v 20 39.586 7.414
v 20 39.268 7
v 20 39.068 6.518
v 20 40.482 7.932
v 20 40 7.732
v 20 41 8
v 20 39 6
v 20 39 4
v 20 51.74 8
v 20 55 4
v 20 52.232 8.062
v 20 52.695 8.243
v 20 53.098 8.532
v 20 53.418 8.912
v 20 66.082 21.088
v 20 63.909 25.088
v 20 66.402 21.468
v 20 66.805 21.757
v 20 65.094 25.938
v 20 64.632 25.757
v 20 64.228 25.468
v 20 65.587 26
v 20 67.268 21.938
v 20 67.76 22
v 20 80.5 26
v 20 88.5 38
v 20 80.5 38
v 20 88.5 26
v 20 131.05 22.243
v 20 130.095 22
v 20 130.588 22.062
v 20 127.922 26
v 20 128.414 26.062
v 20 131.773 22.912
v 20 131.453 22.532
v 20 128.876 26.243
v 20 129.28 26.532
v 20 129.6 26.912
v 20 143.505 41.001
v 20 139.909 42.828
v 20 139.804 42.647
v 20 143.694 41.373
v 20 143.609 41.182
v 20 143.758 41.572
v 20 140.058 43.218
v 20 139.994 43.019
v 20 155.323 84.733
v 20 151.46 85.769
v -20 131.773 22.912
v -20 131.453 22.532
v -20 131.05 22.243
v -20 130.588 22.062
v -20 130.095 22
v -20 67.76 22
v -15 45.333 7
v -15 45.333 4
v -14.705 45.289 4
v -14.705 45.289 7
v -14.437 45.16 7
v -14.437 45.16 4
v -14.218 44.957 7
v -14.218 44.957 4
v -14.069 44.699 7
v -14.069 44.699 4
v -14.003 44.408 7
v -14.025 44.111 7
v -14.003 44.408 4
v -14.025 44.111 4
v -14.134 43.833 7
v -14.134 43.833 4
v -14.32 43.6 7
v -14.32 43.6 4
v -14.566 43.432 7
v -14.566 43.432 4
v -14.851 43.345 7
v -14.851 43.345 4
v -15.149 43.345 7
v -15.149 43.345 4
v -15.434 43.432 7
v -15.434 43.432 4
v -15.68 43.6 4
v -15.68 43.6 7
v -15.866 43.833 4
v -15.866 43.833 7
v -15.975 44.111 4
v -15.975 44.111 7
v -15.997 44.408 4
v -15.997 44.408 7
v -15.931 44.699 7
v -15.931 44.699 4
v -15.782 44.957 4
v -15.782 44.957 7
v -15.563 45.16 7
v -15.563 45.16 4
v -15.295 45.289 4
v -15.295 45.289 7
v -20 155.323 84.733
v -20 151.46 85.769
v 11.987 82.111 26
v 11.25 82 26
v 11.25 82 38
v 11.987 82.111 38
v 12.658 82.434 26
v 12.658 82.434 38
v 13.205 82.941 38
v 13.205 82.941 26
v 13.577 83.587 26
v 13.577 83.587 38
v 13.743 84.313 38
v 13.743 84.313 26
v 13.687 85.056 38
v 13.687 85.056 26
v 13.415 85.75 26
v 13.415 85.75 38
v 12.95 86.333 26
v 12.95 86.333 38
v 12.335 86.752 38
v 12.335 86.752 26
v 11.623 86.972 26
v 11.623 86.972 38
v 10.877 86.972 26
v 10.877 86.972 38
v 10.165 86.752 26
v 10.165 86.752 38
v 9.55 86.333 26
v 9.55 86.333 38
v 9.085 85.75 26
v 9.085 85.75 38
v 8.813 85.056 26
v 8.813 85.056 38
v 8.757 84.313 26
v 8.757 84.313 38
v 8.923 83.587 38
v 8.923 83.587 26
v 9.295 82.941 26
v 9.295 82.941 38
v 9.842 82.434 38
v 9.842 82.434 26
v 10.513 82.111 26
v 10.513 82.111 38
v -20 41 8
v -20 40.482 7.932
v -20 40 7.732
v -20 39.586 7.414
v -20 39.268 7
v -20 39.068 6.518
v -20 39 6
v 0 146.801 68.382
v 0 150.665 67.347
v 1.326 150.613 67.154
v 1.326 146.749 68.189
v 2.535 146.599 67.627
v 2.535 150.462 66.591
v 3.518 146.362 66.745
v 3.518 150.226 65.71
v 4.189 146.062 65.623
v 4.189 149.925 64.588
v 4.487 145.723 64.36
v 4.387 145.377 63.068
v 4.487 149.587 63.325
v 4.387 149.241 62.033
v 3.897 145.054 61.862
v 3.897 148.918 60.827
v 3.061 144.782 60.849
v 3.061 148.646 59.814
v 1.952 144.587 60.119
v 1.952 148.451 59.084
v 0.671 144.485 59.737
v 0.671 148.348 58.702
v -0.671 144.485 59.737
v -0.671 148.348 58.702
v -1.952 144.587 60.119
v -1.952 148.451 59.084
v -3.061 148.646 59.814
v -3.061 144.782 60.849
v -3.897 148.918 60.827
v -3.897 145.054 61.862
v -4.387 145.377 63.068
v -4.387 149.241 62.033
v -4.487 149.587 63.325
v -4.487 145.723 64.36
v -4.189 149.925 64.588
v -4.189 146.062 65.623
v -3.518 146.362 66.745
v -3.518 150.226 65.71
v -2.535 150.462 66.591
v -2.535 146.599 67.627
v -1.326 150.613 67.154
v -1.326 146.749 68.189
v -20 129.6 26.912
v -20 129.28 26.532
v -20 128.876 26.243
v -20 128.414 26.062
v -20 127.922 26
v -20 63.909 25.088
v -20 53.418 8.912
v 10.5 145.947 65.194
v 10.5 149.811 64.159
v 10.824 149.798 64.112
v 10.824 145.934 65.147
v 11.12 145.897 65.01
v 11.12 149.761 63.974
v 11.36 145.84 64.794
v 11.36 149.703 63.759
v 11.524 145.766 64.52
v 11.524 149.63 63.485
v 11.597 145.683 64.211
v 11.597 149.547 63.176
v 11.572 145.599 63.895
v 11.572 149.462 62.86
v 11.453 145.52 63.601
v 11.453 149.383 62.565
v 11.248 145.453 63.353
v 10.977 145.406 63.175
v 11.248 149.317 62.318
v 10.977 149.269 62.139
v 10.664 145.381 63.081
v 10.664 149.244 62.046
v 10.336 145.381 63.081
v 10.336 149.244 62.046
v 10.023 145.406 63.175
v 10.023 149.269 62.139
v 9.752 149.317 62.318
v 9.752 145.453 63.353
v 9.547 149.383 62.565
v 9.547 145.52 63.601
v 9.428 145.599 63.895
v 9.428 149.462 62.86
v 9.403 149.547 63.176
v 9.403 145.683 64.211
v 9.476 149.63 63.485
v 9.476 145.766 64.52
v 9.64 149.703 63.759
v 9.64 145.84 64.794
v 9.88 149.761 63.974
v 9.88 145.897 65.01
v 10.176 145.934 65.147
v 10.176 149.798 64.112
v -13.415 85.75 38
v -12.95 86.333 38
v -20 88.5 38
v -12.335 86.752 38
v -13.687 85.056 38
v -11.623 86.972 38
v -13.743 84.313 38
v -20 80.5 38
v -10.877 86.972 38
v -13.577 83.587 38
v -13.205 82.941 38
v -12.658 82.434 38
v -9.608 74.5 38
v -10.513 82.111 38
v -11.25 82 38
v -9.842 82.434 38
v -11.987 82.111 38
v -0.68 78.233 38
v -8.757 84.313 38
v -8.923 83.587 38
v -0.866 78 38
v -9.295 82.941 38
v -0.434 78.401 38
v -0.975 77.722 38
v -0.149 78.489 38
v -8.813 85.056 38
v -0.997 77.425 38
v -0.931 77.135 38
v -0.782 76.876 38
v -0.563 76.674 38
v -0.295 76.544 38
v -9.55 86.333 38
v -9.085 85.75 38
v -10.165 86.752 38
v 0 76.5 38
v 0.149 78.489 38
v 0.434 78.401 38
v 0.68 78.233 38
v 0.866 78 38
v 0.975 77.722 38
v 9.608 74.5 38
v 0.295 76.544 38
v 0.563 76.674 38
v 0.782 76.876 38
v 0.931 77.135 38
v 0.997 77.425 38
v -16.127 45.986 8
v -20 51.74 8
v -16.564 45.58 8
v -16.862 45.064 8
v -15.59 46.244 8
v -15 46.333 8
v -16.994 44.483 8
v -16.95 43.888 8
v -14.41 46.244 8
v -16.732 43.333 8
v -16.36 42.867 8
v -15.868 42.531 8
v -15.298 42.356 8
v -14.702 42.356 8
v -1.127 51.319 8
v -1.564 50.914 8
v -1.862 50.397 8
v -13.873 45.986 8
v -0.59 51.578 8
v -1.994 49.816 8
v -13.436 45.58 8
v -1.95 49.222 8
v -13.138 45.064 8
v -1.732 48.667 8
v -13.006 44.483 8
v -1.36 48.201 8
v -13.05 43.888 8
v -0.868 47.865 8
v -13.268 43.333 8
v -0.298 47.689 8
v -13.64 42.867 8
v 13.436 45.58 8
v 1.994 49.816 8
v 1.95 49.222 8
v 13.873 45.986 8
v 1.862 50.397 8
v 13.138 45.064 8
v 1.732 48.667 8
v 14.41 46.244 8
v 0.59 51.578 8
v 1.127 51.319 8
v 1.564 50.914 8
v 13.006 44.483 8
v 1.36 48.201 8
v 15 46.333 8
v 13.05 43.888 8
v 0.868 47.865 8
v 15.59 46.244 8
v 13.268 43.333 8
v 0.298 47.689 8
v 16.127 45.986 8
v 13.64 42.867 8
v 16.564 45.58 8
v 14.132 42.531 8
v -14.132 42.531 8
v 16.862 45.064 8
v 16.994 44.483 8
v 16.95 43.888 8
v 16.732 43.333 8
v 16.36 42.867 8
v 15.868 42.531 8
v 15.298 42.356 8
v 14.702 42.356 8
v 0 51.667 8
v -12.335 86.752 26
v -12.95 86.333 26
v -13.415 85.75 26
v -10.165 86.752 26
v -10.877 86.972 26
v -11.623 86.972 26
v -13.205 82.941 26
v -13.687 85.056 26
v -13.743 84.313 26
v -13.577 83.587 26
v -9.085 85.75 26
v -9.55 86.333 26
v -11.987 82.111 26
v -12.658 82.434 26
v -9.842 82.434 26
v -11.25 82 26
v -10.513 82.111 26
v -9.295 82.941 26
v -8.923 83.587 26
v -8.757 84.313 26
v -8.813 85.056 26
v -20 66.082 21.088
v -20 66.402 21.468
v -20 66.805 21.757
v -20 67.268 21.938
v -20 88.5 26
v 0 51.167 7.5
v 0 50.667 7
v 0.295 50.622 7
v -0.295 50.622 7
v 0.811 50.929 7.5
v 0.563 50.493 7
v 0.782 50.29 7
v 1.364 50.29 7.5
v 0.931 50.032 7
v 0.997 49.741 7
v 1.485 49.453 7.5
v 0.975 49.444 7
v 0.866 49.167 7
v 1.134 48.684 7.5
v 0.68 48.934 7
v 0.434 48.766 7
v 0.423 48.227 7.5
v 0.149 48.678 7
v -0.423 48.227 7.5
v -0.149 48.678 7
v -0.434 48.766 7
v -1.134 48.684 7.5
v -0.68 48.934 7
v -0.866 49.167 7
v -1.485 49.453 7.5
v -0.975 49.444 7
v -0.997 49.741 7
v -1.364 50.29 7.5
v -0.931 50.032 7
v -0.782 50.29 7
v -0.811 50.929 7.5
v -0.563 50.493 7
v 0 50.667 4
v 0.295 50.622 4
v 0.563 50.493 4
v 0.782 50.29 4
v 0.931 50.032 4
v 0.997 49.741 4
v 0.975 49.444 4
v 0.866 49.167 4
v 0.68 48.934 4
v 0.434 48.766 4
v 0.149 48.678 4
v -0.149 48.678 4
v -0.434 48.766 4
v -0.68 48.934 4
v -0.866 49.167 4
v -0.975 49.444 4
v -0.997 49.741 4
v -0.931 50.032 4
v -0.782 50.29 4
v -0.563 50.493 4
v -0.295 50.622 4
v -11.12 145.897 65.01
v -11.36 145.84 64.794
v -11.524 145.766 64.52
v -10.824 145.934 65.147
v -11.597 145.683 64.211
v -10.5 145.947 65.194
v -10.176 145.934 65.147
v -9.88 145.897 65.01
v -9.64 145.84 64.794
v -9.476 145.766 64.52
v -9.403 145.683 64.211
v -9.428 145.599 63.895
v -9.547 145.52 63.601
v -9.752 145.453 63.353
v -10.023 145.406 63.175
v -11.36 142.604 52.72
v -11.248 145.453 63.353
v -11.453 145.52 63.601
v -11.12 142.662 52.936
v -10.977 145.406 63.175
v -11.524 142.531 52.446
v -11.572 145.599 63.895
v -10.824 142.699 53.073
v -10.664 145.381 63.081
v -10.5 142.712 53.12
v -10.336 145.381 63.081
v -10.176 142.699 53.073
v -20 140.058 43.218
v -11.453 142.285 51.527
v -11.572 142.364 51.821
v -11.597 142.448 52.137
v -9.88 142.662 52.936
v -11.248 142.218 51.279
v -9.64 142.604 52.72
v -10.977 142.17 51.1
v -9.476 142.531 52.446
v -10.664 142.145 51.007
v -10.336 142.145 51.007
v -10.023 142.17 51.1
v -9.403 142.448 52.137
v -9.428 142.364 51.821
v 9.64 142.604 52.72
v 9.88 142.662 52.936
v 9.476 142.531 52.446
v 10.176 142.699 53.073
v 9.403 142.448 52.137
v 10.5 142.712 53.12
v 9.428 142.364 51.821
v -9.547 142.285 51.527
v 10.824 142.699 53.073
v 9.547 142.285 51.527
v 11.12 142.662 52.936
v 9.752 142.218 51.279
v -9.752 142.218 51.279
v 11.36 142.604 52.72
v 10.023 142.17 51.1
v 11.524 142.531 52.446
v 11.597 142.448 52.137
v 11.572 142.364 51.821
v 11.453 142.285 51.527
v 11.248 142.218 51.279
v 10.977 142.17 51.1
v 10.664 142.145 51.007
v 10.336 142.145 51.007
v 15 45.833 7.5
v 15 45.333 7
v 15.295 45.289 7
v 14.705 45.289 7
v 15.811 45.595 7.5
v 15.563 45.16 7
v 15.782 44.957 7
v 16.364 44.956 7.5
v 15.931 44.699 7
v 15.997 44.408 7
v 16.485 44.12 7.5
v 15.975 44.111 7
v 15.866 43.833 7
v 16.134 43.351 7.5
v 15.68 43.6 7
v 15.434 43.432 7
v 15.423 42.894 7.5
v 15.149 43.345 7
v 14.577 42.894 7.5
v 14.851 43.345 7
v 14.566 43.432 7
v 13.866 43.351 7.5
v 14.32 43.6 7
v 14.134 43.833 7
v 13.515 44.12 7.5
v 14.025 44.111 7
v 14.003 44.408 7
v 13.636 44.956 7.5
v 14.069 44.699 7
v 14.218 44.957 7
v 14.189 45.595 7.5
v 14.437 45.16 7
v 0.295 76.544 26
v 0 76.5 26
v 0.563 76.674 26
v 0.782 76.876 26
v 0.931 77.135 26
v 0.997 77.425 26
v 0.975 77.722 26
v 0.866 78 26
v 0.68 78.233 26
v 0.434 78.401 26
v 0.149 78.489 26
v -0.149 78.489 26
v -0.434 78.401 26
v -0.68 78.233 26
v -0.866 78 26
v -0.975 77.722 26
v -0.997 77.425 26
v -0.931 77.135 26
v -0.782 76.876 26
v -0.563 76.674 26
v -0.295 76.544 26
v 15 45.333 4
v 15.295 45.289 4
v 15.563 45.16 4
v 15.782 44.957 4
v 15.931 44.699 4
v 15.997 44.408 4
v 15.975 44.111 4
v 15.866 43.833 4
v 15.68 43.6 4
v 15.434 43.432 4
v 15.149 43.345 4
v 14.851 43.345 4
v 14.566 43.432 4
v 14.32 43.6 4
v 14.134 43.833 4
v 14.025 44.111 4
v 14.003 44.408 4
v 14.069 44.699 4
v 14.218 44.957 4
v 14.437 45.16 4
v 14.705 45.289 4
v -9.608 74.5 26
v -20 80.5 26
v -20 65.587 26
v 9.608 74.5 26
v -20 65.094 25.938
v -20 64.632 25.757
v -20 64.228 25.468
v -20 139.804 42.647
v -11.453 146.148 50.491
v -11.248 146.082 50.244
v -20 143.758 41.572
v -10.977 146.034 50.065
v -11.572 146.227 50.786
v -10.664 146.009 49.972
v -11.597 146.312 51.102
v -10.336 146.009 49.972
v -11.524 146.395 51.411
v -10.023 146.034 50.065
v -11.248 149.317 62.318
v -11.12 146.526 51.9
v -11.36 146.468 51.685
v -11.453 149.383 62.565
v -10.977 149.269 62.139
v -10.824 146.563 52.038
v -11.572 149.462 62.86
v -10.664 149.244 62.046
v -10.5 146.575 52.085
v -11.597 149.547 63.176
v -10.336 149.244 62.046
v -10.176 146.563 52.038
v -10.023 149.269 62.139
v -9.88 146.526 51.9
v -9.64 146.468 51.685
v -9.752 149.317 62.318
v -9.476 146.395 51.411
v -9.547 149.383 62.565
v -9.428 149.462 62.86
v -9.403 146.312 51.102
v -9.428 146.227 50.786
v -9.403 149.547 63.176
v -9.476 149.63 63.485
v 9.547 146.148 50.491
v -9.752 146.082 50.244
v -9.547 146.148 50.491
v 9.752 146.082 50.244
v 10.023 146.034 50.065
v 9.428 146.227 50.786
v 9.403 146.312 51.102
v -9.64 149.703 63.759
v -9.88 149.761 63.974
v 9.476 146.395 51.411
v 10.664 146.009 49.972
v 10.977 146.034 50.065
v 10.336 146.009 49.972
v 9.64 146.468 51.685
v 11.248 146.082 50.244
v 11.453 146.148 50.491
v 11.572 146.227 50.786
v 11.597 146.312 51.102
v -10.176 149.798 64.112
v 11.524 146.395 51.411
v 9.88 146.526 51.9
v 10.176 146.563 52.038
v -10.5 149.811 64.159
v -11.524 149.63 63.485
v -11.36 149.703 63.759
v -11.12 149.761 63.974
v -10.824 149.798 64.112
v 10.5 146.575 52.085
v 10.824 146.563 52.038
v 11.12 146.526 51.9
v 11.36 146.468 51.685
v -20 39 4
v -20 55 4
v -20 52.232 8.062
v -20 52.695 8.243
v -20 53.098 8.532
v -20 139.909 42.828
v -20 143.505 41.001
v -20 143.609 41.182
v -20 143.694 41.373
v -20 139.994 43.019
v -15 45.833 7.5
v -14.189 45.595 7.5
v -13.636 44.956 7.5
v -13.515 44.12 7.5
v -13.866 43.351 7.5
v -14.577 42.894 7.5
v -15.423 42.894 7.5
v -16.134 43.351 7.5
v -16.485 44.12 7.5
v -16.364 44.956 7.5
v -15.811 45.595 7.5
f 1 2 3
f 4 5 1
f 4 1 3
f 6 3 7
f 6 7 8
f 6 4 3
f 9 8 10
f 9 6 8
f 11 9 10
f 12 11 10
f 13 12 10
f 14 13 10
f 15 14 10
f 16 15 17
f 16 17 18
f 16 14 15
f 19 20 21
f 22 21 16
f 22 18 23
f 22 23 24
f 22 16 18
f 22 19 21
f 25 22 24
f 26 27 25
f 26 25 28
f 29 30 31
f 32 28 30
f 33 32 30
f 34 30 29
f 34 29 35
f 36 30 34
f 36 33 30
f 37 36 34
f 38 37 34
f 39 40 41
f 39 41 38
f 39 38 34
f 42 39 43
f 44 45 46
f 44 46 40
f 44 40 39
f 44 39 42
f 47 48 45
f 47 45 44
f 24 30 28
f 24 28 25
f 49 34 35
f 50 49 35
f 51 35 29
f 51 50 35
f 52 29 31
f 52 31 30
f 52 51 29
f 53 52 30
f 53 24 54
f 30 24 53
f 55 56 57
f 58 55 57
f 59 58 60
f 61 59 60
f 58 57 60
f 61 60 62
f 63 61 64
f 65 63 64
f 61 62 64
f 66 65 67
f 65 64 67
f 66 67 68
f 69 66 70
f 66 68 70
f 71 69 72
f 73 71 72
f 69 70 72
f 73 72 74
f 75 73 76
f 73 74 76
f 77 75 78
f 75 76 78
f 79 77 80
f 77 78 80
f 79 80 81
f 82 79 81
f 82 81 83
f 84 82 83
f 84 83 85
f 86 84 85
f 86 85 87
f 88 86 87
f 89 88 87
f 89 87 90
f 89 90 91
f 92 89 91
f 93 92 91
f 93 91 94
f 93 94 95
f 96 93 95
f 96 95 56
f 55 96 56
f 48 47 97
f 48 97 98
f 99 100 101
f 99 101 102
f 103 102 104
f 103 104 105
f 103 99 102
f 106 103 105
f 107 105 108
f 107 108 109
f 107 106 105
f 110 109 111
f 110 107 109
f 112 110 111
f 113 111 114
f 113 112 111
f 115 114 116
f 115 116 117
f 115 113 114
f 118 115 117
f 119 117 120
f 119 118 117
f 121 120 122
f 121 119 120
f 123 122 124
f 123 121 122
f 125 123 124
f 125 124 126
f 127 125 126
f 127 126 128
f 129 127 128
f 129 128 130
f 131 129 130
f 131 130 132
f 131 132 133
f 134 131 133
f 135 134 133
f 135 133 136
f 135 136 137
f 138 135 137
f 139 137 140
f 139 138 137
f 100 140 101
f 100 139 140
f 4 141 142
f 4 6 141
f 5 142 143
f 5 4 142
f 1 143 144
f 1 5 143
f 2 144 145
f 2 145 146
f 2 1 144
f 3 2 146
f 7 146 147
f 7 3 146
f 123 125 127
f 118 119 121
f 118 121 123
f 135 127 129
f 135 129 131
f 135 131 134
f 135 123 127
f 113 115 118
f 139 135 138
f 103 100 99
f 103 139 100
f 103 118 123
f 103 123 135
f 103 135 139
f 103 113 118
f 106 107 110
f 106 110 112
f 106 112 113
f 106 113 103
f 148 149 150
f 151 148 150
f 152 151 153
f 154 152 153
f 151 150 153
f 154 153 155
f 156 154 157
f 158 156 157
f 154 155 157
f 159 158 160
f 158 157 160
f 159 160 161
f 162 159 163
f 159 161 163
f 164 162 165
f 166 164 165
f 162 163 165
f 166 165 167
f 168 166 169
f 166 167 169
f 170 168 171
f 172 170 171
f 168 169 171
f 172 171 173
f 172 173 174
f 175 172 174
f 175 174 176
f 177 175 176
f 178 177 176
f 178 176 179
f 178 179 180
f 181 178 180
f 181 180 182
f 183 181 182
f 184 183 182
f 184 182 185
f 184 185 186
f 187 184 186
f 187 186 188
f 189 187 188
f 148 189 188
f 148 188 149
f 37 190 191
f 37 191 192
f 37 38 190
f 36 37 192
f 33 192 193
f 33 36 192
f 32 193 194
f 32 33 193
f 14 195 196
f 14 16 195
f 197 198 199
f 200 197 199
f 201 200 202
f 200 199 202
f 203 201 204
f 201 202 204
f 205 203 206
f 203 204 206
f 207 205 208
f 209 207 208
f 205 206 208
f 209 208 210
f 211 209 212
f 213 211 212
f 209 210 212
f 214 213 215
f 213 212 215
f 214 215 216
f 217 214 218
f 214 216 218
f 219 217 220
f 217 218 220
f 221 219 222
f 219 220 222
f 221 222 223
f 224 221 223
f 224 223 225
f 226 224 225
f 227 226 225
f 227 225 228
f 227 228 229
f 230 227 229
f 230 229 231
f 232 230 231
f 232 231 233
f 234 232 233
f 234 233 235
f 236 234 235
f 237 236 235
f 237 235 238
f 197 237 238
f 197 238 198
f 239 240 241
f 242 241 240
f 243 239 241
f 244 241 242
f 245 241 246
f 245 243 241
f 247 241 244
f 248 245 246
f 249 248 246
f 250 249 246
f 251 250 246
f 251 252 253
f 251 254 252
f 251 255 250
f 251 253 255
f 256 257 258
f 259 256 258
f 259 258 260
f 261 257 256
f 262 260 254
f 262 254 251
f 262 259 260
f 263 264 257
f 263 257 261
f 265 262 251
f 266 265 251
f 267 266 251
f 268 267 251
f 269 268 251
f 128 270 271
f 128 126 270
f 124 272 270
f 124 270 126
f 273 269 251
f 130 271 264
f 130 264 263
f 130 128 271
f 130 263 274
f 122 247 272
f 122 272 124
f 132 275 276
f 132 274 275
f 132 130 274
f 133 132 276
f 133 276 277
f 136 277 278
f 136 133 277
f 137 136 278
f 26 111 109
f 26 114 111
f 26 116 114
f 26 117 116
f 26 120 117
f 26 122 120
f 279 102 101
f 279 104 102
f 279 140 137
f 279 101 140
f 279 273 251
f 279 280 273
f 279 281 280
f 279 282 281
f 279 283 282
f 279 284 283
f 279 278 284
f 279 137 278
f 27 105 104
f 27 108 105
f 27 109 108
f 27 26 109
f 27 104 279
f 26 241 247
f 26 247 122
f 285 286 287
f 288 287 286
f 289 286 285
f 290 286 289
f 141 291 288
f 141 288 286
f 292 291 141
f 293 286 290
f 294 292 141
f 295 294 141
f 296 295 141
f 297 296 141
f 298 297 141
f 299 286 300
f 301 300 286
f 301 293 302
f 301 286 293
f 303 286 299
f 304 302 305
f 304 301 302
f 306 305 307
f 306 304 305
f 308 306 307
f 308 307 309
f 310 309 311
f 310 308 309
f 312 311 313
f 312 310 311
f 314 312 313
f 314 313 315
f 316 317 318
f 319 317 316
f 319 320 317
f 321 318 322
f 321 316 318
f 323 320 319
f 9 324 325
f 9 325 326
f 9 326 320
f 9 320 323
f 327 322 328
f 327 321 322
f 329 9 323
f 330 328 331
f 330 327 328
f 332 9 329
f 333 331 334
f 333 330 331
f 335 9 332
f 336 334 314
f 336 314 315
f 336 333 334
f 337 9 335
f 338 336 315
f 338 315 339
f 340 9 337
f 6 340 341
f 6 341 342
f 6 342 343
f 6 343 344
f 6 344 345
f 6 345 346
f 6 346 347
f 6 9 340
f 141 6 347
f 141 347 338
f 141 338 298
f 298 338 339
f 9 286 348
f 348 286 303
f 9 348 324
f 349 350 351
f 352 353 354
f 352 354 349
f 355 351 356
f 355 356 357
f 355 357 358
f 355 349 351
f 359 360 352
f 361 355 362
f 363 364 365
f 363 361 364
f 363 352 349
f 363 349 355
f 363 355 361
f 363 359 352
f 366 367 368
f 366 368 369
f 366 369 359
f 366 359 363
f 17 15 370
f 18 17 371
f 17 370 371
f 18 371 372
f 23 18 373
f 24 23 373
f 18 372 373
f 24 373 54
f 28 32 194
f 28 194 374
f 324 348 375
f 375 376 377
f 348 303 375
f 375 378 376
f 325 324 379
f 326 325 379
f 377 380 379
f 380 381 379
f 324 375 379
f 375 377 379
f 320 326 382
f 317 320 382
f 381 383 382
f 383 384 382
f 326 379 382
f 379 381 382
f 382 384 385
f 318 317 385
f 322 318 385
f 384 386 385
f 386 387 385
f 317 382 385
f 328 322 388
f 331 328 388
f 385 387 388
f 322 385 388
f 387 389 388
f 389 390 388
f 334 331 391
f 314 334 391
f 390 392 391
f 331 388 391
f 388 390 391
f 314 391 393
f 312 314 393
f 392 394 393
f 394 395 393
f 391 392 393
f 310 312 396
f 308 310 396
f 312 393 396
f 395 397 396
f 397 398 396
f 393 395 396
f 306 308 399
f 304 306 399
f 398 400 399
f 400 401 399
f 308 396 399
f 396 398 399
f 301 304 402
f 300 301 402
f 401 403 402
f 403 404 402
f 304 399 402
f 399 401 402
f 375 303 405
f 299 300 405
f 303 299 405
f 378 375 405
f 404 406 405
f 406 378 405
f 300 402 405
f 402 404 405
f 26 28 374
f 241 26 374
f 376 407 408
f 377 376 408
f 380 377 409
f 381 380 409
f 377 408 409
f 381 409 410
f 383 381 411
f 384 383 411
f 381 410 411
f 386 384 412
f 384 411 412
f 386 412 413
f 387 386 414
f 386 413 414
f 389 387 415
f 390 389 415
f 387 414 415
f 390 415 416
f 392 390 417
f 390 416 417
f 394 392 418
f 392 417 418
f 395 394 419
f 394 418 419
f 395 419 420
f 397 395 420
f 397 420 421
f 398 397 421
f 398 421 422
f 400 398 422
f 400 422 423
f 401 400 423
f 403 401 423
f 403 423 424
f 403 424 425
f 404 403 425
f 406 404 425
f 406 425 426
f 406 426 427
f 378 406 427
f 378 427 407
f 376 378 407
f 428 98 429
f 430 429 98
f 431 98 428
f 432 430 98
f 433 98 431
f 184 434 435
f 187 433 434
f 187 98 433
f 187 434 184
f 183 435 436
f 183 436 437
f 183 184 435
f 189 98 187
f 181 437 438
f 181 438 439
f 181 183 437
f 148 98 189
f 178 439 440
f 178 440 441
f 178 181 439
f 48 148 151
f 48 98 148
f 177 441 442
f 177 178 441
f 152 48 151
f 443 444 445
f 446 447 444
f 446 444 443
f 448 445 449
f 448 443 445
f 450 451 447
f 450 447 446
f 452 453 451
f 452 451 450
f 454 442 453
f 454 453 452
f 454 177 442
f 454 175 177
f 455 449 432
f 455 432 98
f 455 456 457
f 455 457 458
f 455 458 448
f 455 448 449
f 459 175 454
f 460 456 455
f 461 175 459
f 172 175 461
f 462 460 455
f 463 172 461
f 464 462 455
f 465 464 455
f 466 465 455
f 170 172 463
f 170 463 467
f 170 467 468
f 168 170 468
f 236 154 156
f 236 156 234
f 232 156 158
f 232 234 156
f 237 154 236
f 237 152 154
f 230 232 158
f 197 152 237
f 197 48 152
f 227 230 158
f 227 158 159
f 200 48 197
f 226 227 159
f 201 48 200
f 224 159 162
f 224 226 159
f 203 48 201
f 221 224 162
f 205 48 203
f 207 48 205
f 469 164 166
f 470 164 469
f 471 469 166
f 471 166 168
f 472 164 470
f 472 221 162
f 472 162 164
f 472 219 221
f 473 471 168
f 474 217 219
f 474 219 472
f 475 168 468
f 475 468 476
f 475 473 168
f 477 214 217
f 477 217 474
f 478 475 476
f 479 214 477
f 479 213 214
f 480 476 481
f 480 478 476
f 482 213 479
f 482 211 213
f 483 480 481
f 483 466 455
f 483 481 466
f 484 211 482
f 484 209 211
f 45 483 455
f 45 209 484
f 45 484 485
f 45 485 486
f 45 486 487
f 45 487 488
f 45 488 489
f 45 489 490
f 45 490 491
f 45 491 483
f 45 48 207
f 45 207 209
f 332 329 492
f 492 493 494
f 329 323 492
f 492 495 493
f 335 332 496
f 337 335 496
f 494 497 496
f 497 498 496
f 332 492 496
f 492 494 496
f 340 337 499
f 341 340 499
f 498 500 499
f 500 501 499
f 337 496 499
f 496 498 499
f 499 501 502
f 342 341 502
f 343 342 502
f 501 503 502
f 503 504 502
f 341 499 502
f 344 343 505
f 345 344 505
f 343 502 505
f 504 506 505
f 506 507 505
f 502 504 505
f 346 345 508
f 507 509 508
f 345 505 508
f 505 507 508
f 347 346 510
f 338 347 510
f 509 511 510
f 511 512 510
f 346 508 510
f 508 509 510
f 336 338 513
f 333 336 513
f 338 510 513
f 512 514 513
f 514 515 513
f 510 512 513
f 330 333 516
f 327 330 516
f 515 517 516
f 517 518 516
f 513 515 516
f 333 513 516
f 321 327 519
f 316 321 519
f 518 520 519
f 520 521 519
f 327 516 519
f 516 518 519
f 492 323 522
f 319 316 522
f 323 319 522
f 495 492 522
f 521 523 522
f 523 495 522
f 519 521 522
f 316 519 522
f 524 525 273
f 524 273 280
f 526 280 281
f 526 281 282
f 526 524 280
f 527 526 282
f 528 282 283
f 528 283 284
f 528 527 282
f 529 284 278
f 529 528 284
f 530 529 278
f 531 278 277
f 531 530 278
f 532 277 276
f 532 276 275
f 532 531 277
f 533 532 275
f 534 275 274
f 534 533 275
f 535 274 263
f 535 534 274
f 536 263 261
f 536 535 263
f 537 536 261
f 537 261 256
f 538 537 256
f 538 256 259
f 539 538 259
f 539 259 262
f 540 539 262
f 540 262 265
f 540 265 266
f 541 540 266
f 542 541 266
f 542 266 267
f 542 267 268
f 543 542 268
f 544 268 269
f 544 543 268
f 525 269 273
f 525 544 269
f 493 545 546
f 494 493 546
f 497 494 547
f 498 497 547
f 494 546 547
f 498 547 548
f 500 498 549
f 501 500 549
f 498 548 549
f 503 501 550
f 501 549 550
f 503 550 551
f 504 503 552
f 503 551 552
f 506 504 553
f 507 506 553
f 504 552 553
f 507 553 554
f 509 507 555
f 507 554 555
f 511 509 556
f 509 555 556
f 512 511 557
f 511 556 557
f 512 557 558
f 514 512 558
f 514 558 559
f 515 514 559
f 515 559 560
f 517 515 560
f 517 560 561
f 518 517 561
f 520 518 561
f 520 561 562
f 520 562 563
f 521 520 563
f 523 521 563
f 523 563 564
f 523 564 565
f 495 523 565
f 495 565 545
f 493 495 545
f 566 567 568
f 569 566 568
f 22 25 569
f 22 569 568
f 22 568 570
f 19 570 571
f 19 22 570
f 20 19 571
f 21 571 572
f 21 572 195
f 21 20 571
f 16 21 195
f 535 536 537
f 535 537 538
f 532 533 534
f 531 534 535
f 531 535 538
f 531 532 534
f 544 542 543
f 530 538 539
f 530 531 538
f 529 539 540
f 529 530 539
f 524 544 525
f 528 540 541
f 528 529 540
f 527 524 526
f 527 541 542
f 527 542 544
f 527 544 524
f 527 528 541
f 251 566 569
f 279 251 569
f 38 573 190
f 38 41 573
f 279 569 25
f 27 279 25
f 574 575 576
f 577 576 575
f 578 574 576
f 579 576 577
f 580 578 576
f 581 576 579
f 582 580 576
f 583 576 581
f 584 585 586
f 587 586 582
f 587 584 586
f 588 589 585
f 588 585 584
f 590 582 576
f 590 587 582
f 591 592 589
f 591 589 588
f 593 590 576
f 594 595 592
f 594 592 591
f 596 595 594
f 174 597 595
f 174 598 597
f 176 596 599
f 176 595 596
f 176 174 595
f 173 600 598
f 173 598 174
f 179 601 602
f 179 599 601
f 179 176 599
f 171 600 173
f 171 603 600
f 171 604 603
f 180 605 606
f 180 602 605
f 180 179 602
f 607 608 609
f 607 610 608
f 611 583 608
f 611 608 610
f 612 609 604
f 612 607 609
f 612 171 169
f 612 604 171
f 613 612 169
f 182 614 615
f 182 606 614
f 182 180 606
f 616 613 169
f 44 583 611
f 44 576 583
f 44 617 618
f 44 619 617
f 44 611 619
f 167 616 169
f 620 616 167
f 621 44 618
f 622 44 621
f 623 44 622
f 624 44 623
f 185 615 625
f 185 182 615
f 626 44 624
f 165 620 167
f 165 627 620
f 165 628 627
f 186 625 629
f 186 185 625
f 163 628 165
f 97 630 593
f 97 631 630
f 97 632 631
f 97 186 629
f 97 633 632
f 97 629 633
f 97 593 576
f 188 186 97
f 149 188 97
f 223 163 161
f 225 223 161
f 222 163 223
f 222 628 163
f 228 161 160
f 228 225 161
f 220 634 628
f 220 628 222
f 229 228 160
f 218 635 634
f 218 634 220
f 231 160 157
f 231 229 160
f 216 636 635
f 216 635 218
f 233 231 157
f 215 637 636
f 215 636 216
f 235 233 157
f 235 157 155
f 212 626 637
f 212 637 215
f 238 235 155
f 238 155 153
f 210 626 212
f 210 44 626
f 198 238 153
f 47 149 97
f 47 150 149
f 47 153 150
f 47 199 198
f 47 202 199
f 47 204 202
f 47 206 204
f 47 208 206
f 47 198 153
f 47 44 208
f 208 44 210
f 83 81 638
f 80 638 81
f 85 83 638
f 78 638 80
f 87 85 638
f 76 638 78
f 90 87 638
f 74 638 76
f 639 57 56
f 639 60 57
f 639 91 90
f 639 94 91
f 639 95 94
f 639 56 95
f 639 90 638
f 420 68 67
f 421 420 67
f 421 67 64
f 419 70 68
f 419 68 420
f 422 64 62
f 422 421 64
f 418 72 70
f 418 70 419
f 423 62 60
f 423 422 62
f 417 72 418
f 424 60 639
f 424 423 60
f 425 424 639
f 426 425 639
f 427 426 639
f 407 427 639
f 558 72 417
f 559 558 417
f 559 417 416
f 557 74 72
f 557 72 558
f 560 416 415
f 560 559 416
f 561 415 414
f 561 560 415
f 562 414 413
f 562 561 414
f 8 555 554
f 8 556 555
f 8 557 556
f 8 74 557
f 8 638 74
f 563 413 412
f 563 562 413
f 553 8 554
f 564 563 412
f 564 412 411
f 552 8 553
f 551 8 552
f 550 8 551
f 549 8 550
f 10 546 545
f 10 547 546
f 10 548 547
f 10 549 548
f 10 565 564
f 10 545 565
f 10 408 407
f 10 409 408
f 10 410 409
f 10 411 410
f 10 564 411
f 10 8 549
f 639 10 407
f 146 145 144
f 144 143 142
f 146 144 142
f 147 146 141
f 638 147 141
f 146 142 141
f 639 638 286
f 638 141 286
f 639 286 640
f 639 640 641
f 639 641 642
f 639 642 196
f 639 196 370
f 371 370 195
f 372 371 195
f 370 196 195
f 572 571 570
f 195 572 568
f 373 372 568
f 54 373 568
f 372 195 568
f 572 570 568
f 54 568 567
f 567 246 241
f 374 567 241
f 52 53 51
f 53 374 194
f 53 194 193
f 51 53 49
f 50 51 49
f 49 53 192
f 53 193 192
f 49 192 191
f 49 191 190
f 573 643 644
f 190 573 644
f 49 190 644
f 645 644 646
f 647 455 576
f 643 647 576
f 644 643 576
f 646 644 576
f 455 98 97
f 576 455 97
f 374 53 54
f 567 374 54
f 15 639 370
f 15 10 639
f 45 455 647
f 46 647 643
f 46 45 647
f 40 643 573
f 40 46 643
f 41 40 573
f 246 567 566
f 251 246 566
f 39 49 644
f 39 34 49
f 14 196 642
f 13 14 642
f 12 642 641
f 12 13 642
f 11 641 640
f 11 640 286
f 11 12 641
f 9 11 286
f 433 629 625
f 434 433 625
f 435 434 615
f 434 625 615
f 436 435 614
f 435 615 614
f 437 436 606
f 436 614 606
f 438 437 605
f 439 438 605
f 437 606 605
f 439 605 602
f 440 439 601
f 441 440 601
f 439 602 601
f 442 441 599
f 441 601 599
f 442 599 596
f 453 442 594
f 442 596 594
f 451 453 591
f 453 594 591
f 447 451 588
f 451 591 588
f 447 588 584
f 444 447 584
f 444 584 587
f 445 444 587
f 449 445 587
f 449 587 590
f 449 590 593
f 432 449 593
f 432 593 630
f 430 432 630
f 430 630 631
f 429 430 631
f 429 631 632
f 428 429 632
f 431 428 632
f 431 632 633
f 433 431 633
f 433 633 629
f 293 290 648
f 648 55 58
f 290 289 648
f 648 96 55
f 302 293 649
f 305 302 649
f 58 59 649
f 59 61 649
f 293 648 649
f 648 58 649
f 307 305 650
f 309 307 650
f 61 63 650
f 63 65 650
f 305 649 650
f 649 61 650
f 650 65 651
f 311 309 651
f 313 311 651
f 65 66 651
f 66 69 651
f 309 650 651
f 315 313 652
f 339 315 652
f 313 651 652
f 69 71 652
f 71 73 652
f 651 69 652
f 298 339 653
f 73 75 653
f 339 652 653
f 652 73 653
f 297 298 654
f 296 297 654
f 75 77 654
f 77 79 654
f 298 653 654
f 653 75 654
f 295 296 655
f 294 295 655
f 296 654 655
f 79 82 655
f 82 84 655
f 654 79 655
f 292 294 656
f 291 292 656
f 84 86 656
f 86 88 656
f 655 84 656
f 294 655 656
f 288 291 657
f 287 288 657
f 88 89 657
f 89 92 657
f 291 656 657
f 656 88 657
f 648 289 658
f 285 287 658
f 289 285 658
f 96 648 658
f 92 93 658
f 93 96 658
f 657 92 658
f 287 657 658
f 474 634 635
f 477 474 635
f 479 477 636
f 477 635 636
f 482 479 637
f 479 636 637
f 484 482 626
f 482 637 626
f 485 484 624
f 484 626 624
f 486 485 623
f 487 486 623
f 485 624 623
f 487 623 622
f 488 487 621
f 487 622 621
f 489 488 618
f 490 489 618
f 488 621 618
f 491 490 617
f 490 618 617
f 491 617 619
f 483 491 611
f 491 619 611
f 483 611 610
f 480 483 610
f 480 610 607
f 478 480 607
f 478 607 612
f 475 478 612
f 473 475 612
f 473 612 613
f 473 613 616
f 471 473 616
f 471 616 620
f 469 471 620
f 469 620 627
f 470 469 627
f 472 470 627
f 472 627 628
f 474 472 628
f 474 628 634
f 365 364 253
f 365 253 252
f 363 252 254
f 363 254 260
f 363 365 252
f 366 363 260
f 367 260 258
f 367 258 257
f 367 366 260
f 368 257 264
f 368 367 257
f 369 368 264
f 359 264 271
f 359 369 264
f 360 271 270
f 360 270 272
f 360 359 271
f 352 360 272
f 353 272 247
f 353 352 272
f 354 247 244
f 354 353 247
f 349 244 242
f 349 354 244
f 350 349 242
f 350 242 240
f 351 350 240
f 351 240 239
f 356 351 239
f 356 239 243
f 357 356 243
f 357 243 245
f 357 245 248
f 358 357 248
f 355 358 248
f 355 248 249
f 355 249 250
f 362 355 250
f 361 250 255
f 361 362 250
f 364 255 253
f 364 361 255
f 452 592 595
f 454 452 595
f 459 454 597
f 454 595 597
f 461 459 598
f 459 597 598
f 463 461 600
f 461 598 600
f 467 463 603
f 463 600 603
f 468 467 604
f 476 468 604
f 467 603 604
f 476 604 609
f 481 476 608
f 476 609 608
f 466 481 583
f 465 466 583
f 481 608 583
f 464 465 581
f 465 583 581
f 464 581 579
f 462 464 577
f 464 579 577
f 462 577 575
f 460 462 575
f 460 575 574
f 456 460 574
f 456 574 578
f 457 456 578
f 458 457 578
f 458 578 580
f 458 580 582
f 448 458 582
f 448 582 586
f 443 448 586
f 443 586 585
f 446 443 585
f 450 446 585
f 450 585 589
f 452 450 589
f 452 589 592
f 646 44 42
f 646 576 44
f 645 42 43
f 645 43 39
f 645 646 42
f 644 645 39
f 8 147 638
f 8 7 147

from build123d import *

# Parameters (mm, degrees)
PAD003_DEPTH    = 20
SKETCH006_R     = 4.5
SKETCH006_R_2   = 1.1
POCKET001_DEPTH = 112.6287098757
SKETCH007_R     = 2.5
SKETCH007_R_2   = 1
PAD004_DEPTH    = 12
FILLET002_R     = 2
SKETCH008_R     = 1
POCKET002_DEPTH = 5
CHAMFER_SIZE    = 1


with BuildPart() as part:
    # Sketch005 → Pad003 (new body, symmetric)
    with BuildSketch(Plane.YZ):
        Polygon((143.6765268423, 41.2666689085), (155.3233838719, 84.7333310915), (151.4596805668, 85.7686072719), (139.9764644611, 42.9126613312), (129.0082348028, 26), (84.4999553571, 26), (64.4999553571, 26), (52.8265628624, 8), (39, 8), (39, 4), (47, 4), (55, 4), (66.6733924947, 22), (131.1816719404, 22), align=None)
    extrude(amount=PAD003_DEPTH, both=True)

    # Sketch006 (on Face8 of Pad003) → Pocket001 (cut, through all)
    with BuildSketch(Plane(origin=(0, 123.7353572805, -33.1547890585), x_dir=(0, 0.2588190451, 0.9659258263), z_dir=(0, 0.9659258263, -0.2588190451))):
        with Locations((99.5467627446, 0)):
            Circle(SKETCH006_R)
        with Locations((99.6467627446, 10.5)):
            Circle(SKETCH006_R_2)
        with Locations((99.6467627446, -10.5)):
            Circle(SKETCH006_R_2)
        with Locations((87.1467627446, -10.5)):
            Circle(SKETCH006_R_2)
        with Locations((87.1467627446, 10.5)):
            Circle(SKETCH006_R_2)
    extrude(amount=-POCKET001_DEPTH, mode=Mode.SUBTRACT)

    # Sketch007 (on Face16 of Pocket001) → Pad004 (join)
    with BuildSketch(Plane(origin=(0, 0, 26), x_dir=(0, -1, 0), z_dir=(0, 0, 1))):
        Polygon((-80.4999553571, 20), (-88.4999553571, 20), (-88.4999553571, -20), (-80.4999553571, -20), (-74.4999553571, -9.6076951546), (-74.4999553571, 9.6076951546), align=None)
        with Locations((-84.4999553571, -11.25)):
            Circle(SKETCH007_R, mode=Mode.SUBTRACT)
        with Locations((-84.4999553571, 11.25)):
            Circle(SKETCH007_R, mode=Mode.SUBTRACT)
        with Locations((-77.4999553571, 0)):
            Circle(SKETCH007_R_2, mode=Mode.SUBTRACT)
    extrude(amount=PAD004_DEPTH)

    # Fillet002
    fillet002_edges = [part.edges().sort_by_distance(p)[0] for p in [
        (0, 139.976464, 42.912661),
        (0, 52.826563, 8),
        (0, 129.008235, 26),
        (0, 64.499955, 26),
        (0, 39, 8),
        (0, 143.676527, 41.266669),
        (0, 131.181672, 22),
        (0, 66.673392, 22),
    ]]
    fillet(fillet002_edges, radius=FILLET002_R)

    # Sketch008 (on Face8 of Pad004) → Pocket002 (cut)
    with BuildSketch(Plane.YX.offset(-4)):
        with Locations((44.3333333333, 15)):
            Circle(SKETCH008_R)
        with Locations((44.3333333333, -15)):
            Circle(SKETCH008_R)
        with Locations((49.6666666667, 0)):
            Circle(SKETCH008_R)
    extrude(amount=-POCKET002_DEPTH, mode=Mode.SUBTRACT)

    # Chamfer
    chamfer_edges = [part.edges().sort_by_distance(p)[0] for p in [
        (15, 43.333333, 8),
        (0, 48.666667, 8),
        (-15, 43.333333, 8),
    ]]
    chamfer(chamfer_edges, length=CHAMFER_SIZE)


solid = part.part
